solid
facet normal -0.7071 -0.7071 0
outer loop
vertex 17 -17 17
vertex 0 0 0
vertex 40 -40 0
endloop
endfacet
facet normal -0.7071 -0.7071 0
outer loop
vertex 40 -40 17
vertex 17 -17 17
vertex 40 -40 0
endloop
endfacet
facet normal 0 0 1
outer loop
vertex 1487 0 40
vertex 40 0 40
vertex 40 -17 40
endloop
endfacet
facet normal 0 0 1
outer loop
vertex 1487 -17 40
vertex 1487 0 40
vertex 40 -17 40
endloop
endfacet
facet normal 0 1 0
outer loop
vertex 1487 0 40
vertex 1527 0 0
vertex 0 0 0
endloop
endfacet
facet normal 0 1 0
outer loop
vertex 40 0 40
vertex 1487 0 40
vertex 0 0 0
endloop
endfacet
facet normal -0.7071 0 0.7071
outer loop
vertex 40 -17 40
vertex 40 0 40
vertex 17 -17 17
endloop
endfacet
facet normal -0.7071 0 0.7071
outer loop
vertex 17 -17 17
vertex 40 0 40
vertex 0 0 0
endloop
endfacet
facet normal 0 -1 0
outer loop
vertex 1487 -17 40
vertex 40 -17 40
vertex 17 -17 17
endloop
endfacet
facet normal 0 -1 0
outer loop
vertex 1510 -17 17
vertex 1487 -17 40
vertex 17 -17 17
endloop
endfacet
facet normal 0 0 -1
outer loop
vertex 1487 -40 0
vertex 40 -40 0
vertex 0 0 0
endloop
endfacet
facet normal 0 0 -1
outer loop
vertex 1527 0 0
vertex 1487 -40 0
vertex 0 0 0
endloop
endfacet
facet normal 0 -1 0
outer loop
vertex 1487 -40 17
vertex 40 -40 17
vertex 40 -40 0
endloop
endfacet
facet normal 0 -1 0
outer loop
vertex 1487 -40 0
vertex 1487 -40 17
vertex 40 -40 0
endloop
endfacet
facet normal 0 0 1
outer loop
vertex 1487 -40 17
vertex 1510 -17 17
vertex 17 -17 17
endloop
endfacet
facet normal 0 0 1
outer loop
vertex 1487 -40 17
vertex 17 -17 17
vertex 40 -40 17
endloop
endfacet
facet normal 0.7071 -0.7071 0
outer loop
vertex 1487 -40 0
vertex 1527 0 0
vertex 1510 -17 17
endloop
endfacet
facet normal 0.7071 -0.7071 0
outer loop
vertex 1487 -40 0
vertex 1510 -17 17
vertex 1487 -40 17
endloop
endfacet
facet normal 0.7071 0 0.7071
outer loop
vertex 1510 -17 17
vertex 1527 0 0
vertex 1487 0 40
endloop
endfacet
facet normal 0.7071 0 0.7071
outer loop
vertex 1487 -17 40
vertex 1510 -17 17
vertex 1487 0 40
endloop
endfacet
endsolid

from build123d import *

# Parameters (mm, degrees)
BOSS_EXTRU_1_DEPTH      = 1527
ENL_V_MAT_EXTRU_1_DEPTH = 41
ENL_V_MAT_EXTRU_2_DEPTH = 41


with BuildPart() as part:
    # Esquisse1 → Boss.-Extru.1 (new body)
    with BuildSketch(Plane(origin=(0, 0, 0), x_dir=(0, 0, -1), z_dir=(1, 0, 0))):
        Polygon((0, 0), (-40, 0), (-40, -17), (-17, -17), (-17, -40), (0, -40), align=None)
    extrude(amount=BOSS_EXTRU_1_DEPTH)

    # Esquisse2 → Enlèv. mat.-Extru.1 (cut, through all)
    with BuildSketch(Plane(origin=(0, 0, 0), x_dir=(1, 0, 0), z_dir=(0, 1, 0))):
        Polygon((1527, 0), (1487, -40), (1527, -40), align=None)
        Polygon((0, 0), (0, -40), (40, -40), align=None)
    extrude(amount=-ENL_V_MAT_EXTRU_1_DEPTH, mode=Mode.SUBTRACT)

    # Esquisse3 → Enlèv. mat.-Extru.2 (cut, through all)
    with BuildSketch(Plane(origin=(0, 0, 0), x_dir=(-1, 0, 0), z_dir=(0, 0, -1))):
        Polygon((-1527, 0), (-1487, -40), (-1527, -40), align=None)
        Polygon((-40, -40), (0, -40), (0, 0), align=None)
    extrude(amount=-ENL_V_MAT_EXTRU_2_DEPTH, mode=Mode.SUBTRACT)


solid = part.part
